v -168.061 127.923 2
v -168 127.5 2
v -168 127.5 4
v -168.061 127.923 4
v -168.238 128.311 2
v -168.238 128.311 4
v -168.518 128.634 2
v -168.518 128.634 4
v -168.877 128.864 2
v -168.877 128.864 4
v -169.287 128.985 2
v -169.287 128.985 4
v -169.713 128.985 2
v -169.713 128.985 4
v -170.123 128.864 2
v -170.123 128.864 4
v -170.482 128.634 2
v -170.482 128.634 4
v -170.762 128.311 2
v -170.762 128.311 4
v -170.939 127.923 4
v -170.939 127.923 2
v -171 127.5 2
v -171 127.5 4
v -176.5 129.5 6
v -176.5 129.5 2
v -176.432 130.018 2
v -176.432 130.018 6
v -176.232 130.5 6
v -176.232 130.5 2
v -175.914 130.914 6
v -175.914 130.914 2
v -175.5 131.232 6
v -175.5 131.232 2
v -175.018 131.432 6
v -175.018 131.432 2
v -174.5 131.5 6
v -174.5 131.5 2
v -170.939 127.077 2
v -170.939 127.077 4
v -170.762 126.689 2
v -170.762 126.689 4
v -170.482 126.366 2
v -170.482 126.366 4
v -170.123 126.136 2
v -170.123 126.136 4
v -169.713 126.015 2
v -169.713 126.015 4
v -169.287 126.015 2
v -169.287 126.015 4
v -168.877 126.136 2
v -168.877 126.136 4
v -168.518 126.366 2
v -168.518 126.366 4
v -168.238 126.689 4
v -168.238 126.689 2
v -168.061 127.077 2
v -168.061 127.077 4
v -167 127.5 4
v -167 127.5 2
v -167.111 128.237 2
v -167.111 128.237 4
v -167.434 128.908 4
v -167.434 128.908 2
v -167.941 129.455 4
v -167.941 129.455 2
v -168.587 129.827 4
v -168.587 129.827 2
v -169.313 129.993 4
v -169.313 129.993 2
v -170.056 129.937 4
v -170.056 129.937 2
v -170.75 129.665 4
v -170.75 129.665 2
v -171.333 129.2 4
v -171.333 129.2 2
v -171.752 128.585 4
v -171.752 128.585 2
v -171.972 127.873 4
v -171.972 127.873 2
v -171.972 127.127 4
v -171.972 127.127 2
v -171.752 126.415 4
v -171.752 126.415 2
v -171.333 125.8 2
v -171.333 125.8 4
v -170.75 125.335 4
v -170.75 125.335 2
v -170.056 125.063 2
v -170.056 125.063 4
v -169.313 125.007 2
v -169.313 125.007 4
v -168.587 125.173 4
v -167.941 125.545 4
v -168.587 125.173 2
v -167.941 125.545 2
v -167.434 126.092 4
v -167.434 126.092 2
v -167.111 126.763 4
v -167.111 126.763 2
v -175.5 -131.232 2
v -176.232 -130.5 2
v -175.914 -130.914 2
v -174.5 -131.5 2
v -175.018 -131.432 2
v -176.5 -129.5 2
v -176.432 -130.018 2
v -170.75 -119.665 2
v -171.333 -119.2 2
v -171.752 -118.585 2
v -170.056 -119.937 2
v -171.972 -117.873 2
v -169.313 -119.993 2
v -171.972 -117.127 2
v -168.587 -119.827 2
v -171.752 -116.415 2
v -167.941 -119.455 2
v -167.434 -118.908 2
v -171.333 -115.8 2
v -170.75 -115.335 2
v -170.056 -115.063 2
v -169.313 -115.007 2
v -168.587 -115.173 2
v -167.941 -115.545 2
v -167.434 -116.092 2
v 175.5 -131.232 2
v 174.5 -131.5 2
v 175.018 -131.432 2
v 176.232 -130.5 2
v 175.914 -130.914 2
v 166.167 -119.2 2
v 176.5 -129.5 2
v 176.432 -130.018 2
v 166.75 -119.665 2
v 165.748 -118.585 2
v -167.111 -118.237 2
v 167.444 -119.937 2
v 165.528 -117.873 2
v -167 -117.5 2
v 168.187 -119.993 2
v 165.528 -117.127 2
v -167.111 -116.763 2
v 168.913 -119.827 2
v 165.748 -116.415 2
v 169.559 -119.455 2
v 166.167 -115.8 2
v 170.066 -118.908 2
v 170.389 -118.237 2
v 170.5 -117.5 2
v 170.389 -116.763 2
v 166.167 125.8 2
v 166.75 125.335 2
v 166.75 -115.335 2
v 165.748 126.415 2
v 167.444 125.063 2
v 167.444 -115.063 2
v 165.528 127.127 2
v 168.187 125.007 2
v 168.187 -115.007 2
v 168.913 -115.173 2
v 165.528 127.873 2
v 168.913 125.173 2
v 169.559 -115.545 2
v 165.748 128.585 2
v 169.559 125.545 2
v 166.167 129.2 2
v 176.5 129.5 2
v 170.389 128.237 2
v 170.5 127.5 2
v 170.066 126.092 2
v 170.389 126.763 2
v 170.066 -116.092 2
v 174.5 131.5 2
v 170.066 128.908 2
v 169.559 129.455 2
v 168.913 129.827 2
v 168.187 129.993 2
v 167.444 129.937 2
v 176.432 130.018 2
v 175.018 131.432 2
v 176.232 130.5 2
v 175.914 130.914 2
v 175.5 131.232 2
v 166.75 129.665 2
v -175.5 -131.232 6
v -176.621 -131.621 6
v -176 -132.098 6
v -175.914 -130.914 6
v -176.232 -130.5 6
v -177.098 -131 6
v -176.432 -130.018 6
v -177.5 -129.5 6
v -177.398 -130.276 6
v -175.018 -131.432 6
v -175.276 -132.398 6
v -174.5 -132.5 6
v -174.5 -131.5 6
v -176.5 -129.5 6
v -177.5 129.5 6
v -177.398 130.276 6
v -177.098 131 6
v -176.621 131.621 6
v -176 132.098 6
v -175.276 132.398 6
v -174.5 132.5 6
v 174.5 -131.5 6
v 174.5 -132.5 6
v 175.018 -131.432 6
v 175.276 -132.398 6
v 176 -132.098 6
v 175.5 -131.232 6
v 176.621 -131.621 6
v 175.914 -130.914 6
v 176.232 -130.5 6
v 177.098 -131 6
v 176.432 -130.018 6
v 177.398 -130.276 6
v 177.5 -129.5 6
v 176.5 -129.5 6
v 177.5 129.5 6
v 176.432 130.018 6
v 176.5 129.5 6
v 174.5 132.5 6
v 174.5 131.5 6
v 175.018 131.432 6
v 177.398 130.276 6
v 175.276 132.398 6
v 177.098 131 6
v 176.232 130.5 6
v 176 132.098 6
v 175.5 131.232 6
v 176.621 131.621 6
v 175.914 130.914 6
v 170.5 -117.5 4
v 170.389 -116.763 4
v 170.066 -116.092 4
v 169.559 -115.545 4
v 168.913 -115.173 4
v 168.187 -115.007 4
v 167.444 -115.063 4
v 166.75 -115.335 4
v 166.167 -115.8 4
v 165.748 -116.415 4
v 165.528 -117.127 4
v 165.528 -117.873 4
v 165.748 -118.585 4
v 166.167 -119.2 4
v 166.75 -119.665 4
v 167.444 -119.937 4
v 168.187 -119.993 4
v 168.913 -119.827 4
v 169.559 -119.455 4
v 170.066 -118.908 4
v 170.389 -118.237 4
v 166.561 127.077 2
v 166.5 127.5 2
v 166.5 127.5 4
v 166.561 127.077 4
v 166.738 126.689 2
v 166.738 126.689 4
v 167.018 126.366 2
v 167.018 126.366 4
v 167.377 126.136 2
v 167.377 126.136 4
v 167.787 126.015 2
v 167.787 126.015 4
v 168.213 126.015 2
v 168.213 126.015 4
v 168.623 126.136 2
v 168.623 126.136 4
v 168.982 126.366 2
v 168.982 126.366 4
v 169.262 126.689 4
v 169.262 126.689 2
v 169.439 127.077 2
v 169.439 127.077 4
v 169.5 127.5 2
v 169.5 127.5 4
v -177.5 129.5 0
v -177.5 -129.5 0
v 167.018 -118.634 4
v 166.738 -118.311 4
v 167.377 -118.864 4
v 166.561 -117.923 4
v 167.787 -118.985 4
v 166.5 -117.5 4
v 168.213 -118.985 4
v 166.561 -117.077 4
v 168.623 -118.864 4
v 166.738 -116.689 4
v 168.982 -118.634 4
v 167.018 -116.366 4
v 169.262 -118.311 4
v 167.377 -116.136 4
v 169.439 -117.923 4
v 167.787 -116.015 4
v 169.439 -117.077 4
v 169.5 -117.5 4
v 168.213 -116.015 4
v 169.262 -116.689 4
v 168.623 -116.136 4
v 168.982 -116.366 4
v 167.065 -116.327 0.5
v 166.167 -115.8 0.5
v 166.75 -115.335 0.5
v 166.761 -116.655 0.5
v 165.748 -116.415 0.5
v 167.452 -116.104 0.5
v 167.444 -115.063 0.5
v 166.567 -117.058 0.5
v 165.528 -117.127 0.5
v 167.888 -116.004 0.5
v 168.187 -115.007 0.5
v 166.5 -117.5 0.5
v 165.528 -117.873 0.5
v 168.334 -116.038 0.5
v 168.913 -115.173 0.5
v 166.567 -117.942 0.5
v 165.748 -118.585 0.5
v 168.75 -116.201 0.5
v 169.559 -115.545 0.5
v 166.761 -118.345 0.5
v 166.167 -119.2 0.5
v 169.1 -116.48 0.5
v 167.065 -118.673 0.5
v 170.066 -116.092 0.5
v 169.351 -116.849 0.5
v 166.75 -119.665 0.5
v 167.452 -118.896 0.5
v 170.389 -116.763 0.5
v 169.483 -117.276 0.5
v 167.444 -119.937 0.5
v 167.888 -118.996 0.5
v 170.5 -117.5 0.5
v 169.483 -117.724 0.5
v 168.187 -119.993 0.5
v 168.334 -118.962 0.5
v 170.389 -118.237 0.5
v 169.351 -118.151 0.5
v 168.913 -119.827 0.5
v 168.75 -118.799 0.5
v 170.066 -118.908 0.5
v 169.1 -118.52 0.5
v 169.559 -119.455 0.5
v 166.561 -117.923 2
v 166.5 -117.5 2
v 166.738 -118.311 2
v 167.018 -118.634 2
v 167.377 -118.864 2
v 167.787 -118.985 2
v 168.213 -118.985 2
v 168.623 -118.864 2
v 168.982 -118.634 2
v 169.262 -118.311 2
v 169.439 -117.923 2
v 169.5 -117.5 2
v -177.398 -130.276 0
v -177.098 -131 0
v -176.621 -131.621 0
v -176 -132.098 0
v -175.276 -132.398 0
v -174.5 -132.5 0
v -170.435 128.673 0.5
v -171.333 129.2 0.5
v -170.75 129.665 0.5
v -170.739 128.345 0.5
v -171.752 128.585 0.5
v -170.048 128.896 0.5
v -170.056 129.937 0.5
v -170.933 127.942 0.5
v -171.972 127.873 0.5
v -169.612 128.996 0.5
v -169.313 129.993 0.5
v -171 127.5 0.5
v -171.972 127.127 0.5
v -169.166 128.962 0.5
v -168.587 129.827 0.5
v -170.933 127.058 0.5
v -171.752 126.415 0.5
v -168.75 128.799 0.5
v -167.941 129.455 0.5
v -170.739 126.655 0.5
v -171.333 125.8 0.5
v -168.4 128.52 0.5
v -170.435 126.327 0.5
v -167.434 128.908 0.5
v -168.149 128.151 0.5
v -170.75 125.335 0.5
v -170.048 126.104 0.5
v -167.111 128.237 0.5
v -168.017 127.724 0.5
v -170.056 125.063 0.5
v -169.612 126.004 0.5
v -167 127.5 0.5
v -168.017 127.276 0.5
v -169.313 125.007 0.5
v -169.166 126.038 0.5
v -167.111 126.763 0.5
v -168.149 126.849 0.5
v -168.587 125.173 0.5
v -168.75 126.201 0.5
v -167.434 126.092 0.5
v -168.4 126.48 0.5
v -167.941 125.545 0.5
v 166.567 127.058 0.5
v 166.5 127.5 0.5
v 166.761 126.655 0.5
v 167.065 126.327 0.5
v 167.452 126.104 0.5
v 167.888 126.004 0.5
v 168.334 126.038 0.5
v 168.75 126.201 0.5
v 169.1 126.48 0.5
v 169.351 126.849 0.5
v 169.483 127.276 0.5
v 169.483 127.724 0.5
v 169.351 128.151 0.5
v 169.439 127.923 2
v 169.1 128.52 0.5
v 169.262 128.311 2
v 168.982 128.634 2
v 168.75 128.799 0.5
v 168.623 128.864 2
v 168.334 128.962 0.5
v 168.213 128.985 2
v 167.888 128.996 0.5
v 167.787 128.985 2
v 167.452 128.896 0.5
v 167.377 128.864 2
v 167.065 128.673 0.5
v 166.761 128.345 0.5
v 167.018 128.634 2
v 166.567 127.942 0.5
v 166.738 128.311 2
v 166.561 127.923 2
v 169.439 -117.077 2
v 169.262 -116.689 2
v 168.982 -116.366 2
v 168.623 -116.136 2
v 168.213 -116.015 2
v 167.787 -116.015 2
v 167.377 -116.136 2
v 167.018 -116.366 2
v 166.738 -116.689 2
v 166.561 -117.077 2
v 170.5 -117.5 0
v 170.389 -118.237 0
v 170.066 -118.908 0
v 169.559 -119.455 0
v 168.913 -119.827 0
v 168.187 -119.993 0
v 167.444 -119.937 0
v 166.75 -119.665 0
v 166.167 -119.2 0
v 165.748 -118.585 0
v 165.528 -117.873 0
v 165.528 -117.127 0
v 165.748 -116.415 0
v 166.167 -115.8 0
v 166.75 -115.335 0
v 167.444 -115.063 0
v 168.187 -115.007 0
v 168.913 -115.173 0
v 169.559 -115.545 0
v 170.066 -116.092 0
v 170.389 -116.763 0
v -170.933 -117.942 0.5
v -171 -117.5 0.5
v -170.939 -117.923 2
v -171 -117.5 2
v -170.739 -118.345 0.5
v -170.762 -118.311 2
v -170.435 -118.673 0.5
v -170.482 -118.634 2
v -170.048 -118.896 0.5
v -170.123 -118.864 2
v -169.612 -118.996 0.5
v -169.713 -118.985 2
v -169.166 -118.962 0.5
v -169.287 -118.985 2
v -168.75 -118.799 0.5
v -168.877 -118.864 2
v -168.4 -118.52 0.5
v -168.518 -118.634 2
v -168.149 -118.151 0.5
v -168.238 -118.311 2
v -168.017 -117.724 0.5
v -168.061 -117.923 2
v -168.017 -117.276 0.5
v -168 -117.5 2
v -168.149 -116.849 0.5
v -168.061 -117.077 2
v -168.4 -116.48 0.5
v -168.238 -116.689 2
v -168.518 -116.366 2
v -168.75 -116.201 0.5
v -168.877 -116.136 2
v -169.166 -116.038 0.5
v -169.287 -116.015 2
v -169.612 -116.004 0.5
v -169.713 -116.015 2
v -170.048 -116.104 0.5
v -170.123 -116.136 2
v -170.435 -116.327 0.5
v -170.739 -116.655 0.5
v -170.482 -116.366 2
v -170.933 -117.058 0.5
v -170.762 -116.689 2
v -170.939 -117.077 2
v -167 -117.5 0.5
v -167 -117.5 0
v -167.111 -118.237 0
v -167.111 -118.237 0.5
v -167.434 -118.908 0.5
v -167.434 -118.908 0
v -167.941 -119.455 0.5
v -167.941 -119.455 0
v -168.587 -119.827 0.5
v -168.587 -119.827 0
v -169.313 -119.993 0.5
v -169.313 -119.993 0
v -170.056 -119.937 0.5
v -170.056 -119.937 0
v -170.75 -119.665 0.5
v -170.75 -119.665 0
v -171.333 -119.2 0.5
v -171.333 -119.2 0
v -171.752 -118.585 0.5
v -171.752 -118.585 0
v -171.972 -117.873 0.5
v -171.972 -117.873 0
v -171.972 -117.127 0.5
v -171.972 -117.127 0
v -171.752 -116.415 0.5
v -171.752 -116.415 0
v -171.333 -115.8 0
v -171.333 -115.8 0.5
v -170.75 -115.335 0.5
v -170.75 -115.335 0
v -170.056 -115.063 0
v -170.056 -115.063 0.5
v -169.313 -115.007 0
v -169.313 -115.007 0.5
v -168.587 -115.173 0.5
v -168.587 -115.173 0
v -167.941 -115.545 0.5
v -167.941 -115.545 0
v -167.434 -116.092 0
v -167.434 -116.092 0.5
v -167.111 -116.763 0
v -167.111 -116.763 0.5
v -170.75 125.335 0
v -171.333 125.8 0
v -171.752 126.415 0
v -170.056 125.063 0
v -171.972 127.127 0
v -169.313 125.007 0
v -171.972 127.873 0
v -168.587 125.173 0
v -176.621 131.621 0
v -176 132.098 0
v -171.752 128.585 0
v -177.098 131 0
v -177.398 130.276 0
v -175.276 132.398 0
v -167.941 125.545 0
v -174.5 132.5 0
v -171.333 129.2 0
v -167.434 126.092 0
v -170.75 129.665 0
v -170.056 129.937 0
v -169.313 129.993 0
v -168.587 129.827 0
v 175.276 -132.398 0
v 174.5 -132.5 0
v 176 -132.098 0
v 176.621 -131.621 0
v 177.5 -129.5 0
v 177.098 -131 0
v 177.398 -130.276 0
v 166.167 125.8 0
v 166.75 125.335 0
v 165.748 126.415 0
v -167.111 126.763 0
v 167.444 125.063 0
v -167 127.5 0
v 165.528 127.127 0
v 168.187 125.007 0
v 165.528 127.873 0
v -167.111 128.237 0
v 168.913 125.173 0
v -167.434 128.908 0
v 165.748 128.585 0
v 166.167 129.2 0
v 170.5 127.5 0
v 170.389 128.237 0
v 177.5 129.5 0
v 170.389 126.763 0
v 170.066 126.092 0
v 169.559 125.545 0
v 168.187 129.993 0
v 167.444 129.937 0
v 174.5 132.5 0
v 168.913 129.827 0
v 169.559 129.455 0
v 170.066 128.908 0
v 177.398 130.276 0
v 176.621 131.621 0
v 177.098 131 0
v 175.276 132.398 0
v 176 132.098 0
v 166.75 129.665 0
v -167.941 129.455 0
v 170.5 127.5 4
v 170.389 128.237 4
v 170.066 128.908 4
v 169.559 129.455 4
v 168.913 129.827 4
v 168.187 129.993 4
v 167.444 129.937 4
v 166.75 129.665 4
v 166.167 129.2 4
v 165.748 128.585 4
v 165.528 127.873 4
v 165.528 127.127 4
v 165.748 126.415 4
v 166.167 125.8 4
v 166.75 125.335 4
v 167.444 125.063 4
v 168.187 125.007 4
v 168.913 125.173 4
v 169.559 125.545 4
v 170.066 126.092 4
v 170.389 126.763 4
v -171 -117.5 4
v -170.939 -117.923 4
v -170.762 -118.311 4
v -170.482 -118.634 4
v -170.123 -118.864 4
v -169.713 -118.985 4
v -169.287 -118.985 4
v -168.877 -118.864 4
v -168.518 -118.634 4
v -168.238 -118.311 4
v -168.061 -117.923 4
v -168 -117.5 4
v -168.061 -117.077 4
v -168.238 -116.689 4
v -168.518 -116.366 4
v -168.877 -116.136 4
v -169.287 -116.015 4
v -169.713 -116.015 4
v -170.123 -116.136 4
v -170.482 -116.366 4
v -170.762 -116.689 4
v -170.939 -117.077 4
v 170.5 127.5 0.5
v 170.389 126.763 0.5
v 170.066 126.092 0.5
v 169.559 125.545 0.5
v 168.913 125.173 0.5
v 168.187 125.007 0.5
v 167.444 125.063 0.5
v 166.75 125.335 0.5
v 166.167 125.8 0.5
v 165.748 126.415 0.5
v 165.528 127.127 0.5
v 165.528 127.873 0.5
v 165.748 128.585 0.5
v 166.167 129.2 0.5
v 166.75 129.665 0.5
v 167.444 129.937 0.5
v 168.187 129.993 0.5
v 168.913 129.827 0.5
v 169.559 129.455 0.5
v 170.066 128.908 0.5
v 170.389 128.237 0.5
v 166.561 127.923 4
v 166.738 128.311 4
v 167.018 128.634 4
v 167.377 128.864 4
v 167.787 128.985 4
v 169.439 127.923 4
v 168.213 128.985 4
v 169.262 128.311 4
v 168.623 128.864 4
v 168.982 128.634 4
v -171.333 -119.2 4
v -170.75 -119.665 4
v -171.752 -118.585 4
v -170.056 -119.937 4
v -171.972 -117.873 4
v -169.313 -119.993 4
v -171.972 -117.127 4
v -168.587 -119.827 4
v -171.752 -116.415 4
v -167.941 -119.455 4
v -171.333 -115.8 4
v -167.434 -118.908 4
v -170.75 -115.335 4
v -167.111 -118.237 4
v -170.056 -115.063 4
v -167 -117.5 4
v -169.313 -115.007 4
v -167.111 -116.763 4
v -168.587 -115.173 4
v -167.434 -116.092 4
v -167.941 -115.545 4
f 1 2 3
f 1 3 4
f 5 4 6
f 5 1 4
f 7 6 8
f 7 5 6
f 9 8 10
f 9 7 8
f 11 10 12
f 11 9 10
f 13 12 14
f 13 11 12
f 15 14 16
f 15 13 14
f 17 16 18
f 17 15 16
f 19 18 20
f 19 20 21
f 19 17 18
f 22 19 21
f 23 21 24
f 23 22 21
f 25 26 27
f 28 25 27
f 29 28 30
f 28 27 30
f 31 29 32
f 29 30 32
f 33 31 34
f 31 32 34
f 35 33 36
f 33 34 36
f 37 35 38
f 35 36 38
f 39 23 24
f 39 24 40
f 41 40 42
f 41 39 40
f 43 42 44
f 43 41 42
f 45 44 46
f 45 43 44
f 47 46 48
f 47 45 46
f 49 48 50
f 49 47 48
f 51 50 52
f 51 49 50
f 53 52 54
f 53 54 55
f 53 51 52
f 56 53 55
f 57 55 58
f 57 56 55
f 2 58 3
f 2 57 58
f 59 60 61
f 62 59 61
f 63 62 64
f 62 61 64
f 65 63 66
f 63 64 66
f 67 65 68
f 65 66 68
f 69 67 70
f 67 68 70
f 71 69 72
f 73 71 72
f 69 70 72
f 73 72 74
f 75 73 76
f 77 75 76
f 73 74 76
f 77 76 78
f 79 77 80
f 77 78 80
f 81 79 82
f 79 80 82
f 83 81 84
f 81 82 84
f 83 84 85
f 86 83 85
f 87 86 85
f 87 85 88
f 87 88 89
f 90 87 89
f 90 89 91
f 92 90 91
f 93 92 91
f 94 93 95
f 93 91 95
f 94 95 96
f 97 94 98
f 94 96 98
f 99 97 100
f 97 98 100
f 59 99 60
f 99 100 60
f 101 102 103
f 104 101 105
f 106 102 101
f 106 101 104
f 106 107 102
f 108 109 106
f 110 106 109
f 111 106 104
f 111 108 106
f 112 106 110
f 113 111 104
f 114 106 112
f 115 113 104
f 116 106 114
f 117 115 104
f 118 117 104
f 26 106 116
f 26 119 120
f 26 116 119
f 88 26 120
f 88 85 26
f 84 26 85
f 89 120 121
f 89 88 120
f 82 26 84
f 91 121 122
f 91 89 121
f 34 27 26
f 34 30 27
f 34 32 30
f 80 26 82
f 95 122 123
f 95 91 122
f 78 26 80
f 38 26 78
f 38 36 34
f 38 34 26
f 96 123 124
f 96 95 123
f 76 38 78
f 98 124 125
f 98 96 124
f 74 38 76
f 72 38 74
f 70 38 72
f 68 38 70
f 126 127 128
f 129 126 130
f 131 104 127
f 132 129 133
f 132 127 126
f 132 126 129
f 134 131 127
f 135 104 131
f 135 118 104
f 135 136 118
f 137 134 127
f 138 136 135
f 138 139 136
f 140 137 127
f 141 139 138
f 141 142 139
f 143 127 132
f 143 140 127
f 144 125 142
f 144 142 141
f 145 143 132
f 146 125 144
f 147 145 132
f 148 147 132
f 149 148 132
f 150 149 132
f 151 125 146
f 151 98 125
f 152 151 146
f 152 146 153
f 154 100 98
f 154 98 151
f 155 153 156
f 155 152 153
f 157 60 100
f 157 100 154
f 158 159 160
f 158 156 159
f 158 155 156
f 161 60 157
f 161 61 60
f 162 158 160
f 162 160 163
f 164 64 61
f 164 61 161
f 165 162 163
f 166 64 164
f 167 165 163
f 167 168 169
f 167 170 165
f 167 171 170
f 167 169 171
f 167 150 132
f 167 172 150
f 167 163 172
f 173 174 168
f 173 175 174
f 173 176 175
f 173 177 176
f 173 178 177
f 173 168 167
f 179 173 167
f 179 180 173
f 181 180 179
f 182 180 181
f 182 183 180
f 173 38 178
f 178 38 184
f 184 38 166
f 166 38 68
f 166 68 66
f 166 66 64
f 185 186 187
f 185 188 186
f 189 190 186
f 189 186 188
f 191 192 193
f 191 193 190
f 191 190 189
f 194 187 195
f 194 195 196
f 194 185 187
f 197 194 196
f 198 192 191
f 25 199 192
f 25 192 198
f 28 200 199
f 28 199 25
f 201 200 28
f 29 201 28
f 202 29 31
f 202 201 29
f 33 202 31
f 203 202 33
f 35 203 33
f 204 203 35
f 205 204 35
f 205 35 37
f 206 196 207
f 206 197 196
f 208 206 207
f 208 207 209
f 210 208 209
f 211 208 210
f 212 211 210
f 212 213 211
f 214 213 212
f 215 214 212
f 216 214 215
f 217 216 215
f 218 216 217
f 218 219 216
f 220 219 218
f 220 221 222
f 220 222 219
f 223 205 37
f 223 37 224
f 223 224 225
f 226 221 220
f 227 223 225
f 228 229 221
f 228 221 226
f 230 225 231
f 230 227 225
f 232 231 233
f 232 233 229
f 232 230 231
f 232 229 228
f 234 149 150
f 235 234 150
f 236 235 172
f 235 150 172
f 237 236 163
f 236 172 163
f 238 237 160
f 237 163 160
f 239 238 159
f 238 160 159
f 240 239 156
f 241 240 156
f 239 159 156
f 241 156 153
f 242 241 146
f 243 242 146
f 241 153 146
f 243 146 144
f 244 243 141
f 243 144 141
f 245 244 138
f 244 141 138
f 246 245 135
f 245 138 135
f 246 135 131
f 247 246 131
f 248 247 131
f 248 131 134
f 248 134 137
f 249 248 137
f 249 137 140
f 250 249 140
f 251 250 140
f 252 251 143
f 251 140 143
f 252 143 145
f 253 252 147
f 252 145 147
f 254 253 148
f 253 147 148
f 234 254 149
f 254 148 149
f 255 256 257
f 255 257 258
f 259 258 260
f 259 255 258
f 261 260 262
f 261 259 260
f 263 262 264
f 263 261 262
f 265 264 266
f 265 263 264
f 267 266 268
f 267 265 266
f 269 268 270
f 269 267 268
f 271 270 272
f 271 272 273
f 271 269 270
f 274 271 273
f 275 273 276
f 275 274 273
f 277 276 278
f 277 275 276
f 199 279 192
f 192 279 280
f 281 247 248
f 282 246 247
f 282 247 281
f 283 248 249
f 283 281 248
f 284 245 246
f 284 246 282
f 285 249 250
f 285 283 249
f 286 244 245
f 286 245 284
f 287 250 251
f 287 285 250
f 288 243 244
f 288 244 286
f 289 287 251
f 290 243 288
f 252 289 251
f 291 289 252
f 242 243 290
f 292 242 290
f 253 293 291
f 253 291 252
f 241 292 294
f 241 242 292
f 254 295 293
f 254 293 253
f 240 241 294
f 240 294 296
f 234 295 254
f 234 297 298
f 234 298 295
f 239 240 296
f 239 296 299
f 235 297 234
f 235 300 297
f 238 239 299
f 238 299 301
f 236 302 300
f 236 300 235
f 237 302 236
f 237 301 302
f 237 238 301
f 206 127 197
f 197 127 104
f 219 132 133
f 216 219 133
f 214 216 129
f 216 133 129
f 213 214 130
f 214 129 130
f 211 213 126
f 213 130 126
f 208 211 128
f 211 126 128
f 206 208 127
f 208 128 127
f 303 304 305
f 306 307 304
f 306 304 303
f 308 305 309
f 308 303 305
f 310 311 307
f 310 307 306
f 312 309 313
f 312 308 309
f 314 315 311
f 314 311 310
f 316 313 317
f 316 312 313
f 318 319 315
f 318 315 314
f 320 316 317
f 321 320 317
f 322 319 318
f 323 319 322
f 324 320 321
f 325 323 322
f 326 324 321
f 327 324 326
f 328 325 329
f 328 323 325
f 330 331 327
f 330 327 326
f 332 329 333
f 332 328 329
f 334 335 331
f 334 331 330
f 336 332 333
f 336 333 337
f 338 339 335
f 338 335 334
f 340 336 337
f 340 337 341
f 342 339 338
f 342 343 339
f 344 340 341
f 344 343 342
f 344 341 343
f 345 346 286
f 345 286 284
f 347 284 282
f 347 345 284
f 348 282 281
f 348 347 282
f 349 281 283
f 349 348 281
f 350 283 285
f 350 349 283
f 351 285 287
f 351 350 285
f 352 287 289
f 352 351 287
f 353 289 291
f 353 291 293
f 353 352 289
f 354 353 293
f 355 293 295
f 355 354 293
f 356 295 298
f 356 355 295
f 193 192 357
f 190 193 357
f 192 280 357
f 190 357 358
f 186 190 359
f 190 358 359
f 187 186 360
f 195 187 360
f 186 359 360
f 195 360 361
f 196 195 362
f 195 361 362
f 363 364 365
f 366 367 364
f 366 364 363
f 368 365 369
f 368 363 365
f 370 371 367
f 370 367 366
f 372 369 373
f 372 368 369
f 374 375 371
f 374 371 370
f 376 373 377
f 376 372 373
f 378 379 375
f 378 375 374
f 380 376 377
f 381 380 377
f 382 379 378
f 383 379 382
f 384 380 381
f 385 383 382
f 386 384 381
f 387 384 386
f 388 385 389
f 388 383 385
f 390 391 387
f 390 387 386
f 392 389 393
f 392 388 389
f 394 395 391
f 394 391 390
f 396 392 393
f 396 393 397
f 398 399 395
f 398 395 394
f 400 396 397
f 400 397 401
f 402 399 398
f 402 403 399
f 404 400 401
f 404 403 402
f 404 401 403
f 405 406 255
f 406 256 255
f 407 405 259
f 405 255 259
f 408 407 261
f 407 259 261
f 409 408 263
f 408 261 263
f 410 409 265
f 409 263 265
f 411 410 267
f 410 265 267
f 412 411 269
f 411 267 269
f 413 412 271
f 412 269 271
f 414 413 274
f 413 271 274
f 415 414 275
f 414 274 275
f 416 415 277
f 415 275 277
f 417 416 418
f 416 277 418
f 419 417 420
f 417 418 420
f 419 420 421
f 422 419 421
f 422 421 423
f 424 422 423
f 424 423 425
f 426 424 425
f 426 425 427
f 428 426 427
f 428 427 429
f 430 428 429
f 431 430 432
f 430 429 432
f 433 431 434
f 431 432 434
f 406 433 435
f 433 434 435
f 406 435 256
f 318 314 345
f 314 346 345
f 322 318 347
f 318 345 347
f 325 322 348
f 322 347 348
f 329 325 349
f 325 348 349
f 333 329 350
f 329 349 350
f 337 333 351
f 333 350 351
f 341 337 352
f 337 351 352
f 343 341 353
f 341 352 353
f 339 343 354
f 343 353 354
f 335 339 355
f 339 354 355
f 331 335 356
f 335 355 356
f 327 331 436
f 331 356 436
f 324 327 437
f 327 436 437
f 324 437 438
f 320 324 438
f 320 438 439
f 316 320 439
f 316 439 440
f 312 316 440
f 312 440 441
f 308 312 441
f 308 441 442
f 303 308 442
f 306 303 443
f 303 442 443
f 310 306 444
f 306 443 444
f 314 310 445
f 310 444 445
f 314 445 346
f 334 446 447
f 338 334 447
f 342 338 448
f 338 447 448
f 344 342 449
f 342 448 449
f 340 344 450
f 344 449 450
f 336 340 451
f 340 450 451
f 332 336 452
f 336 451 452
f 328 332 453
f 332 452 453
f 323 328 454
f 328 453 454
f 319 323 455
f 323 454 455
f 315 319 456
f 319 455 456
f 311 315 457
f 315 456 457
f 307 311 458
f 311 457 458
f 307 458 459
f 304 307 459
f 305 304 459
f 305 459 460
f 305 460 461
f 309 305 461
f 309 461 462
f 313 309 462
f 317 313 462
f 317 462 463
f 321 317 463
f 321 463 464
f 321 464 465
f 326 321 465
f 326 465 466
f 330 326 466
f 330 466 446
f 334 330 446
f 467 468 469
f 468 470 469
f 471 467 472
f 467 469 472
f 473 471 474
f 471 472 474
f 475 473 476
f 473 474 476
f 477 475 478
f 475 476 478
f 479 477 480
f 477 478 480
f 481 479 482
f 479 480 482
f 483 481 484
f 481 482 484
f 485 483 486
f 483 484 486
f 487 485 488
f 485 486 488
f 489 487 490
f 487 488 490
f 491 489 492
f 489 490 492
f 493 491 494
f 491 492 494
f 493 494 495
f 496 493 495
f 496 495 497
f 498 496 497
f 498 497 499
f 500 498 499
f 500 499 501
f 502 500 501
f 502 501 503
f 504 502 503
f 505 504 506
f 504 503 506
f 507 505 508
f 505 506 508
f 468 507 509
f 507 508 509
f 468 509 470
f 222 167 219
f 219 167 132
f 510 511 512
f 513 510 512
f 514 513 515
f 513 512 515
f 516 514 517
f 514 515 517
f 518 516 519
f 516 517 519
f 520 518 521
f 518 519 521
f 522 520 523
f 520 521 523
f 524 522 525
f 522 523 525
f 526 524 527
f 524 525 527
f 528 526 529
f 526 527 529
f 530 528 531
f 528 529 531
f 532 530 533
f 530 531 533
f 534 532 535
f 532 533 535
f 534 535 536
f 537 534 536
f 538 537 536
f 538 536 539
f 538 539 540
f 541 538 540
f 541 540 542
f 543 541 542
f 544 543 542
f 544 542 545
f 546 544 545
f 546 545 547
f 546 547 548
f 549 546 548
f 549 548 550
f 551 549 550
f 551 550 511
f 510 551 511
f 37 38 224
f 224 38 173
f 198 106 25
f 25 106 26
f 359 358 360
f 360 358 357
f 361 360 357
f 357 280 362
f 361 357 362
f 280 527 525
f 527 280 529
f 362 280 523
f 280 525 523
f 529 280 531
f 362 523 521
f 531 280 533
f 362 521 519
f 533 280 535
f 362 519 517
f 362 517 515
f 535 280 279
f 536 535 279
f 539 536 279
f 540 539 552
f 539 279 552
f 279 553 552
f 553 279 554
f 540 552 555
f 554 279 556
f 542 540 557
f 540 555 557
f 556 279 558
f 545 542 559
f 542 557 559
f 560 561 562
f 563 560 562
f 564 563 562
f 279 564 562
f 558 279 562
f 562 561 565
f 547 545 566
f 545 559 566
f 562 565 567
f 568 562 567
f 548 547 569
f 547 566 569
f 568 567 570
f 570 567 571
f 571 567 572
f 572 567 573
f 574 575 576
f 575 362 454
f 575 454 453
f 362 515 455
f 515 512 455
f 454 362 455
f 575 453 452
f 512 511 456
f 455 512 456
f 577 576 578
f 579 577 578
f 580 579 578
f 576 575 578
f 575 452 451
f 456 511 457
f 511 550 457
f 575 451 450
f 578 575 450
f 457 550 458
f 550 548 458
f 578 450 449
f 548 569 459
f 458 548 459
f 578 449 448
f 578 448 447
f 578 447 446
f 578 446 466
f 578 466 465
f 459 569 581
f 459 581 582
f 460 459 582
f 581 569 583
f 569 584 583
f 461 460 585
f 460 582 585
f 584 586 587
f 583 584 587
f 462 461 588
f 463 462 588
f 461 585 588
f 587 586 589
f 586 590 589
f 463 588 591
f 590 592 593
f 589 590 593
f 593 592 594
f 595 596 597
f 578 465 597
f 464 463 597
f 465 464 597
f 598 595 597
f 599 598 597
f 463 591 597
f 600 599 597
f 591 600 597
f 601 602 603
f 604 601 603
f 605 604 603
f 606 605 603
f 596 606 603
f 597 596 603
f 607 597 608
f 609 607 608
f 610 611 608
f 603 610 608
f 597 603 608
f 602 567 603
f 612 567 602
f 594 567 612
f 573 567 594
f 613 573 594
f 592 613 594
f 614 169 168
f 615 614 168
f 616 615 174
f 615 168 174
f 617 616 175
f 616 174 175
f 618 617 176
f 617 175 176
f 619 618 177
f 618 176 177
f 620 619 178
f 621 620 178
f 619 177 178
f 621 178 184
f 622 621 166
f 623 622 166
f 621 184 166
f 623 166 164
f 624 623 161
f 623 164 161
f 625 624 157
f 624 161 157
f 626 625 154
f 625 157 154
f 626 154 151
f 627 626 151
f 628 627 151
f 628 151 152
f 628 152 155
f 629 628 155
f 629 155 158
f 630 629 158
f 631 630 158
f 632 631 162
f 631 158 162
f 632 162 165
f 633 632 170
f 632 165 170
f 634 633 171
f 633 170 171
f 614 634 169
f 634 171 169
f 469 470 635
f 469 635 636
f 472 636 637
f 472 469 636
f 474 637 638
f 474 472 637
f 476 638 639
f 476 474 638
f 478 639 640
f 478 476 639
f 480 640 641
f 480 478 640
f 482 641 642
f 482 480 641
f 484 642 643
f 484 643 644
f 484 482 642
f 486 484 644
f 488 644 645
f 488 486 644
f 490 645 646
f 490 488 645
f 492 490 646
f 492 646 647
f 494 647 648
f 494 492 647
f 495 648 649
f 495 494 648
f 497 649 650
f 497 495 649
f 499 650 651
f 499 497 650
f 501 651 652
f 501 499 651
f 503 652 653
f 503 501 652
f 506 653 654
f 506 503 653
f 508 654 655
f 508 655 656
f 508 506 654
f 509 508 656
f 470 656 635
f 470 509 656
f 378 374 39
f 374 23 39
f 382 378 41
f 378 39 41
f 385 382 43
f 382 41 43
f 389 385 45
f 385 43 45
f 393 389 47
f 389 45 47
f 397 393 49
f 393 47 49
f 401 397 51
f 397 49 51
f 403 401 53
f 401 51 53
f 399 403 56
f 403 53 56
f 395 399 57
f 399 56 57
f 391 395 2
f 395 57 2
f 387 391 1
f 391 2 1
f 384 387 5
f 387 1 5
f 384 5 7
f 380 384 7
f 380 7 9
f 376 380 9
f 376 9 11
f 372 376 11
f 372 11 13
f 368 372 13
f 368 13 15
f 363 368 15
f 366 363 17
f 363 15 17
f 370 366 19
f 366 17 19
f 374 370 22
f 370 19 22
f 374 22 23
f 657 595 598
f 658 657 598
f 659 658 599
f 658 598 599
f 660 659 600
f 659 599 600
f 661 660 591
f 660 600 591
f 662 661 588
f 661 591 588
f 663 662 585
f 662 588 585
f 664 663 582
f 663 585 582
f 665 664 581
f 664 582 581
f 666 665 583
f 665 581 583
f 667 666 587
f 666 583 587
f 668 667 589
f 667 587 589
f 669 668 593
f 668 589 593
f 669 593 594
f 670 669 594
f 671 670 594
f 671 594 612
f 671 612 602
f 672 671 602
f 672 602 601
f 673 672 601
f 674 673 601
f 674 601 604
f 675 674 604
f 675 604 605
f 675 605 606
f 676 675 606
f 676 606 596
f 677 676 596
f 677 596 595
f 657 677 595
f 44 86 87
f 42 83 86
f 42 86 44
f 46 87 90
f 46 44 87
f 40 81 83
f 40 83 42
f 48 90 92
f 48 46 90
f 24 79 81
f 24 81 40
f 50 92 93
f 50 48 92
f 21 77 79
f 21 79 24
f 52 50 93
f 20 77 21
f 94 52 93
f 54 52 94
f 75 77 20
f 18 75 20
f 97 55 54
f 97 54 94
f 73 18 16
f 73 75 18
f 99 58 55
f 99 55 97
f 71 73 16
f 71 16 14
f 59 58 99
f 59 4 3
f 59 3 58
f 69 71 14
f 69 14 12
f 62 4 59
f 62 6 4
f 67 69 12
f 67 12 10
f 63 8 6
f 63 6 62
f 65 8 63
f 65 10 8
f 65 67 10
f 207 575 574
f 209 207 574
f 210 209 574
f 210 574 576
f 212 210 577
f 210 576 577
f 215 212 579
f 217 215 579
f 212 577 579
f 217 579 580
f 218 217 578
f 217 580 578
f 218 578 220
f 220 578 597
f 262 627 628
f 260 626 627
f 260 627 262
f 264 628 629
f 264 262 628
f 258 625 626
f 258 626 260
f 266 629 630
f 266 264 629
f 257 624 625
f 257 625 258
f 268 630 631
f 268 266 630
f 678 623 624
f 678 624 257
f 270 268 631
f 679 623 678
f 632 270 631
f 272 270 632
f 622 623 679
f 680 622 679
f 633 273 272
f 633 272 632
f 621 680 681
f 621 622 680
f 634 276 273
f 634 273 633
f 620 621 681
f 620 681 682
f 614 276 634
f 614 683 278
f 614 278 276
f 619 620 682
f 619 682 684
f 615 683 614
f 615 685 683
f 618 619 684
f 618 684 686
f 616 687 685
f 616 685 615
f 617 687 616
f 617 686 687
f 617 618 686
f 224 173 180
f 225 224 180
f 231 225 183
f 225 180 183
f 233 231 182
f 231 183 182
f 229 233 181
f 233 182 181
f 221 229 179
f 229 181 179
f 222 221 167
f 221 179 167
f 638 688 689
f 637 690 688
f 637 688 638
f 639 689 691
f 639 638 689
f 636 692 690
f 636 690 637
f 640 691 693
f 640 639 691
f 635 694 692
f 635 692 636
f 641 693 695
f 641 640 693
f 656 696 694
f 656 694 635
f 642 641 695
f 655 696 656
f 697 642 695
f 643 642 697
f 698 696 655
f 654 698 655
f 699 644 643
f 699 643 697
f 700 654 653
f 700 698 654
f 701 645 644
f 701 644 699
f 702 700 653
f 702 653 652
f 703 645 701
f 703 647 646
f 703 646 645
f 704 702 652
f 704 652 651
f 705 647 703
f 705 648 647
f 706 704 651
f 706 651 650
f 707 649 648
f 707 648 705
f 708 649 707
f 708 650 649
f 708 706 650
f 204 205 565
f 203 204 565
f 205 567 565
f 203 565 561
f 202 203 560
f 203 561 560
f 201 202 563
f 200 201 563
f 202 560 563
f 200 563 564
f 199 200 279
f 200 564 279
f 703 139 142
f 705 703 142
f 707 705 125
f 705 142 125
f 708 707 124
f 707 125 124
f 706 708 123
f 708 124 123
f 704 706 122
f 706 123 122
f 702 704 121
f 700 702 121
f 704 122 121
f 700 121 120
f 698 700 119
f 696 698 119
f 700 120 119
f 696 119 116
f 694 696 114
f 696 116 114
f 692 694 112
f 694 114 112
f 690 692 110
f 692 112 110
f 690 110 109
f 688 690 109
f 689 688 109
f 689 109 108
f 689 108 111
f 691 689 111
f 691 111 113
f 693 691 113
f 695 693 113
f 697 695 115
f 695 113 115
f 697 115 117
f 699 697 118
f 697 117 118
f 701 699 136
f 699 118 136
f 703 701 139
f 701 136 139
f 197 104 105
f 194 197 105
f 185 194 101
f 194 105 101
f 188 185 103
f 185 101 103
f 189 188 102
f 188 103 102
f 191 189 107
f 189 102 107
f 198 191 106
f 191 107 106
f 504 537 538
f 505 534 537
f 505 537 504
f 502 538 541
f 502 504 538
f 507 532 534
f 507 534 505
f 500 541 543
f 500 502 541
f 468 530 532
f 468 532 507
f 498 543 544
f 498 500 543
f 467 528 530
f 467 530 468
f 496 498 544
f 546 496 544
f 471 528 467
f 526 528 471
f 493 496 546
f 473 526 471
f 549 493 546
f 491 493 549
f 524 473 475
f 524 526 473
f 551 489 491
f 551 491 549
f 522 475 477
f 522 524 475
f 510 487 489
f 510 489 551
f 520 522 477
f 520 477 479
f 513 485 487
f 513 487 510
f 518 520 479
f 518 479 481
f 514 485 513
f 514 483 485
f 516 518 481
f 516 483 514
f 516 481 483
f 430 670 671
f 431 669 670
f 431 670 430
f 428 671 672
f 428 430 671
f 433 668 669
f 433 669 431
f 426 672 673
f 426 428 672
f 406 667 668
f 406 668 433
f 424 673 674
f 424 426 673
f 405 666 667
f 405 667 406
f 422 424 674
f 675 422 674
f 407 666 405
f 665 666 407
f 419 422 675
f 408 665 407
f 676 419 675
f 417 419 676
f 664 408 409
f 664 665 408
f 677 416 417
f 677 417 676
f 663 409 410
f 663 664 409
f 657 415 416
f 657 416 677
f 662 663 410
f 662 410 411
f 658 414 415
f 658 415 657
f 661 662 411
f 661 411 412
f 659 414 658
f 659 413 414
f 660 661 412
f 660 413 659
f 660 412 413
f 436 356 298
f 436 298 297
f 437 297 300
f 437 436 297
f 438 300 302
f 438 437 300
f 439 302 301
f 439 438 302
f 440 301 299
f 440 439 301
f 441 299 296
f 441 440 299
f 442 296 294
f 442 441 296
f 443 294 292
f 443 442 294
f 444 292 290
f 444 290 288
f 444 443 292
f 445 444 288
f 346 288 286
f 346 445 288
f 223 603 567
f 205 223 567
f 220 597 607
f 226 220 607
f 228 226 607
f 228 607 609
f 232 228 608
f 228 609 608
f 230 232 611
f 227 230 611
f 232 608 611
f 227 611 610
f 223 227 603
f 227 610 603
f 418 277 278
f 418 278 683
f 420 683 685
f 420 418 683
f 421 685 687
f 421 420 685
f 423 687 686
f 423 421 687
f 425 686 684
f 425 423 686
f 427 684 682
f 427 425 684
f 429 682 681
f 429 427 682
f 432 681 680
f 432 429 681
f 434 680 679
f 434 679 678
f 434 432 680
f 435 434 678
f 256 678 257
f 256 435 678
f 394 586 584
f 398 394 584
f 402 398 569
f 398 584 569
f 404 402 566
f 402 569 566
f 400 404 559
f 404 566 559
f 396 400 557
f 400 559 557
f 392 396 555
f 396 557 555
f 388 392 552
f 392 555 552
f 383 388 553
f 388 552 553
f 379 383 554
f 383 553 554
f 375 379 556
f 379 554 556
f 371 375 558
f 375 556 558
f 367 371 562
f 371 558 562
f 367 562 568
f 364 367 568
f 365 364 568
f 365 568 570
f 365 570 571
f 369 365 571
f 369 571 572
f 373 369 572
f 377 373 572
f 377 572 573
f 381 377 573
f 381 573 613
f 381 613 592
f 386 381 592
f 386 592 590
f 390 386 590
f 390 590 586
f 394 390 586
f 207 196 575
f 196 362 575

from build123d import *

# Parameters (mm, degrees)
F1_DEPTH       = 2
F2_R           = 2.5
F2_R_2         = 1.5
F3_DEPTH       = 2
F5_DEPTH       = 4
F7_D           = 3
F7_CBORE_D     = 5
F7_CBORE_DEPTH = 0.5


with BuildPart() as f1:
    # F0 (on Top) → F1 (new body)
    with BuildSketch(Plane.XY):
        with BuildLine():
            Line((-174.5, -132.5), (174.5, -132.5))
            ThreePointArc((174.5, -132.5), (176.62132, -131.62132), (177.5, -129.5))
            Line((177.5, -129.5), (177.5, 129.5))
            ThreePointArc((177.5, 129.5), (176.62132, 131.62132), (174.5, 132.5))
            Line((174.5, 132.5), (-174.5, 132.5))
            ThreePointArc((-174.5, 132.5), (-176.62132, 131.62132), (-177.5, 129.5))
            Line((-177.5, 129.5), (-177.5, -129.5))
            ThreePointArc((-177.5, -129.5), (-176.62132, -131.62132), (-174.5, -132.5))
        make_face()
    extrude(amount=F1_DEPTH)

    # F2 (on face) → F3 (join)
    with BuildSketch(Plane.XY.offset(2)):
        with Locations((-169.5, 127.5)):
            Circle(F2_R)
        with Locations((-169.5, 127.5)):
            Circle(F2_R_2, mode=Mode.SUBTRACT)
        with Locations((168, 127.5)):
            Circle(F2_R)
        with Locations((168, 127.5)):
            Circle(F2_R_2, mode=Mode.SUBTRACT)
        with Locations((-169.5, -117.5)):
            Circle(F2_R)
        with Locations((-169.5, -117.5)):
            Circle(F2_R_2, mode=Mode.SUBTRACT)
        with Locations((168, -117.5)):
            Circle(F2_R)
        with Locations((168, -117.5)):
            Circle(F2_R_2, mode=Mode.SUBTRACT)
    extrude(amount=F3_DEPTH)

    # F4 (on face) → F5 (join)
    with BuildSketch(Plane.XY.offset(2)):
        with BuildLine():
            Line((174.5, 132.5), (-174.5, 132.5))
            ThreePointArc((-174.5, 132.5), (-176.62132, 131.62132), (-177.5, 129.5))
            Line((-177.5, 129.5), (-177.5, -129.5))
            ThreePointArc((-177.5, -129.5), (-176.62132, -131.62132), (-174.5, -132.5))
            Line((-174.5, -132.5), (174.5, -132.5))
            ThreePointArc((174.5, -132.5), (176.62132, -131.62132), (177.5, -129.5))
            Line((177.5, -129.5), (177.5, 129.5))
            ThreePointArc((177.5, 129.5), (176.62132, 131.62132), (174.5, 132.5))
        make_face()
        with BuildLine():
            ThreePointArc((-176.5, 129.5), (-175.914214, 130.914214), (-174.5, 131.5))
            Line((-174.5, 131.5), (174.5, 131.5))
            ThreePointArc((174.5, 131.5), (175.914214, 130.914214), (176.5, 129.5))
            Line((176.5, 129.5), (176.5, -129.5))
            ThreePointArc((176.5, -129.5), (175.914214, -130.914214), (174.5, -131.5))
            Line((174.5, -131.5), (-174.5, -131.5))
            ThreePointArc((-174.5, -131.5), (-175.914214, -130.914214), (-176.5, -129.5))
            Line((-176.5, -129.5), (-176.5, 129.5))
        make_face(mode=Mode.SUBTRACT)
    extrude(amount=F5_DEPTH)

    # F7 (through all)
    with Locations(Plane(origin=(0, 0, 0), x_dir=(1, 0, 0), z_dir=(0, 0, -1))):
        with Locations((-169.5, -127.5), (168, -127.5), (168, 117.5), (-169.5, 117.5)):
            CounterBoreHole(F7_D / 2, F7_CBORE_D / 2, F7_CBORE_DEPTH)


solid = f1.part
